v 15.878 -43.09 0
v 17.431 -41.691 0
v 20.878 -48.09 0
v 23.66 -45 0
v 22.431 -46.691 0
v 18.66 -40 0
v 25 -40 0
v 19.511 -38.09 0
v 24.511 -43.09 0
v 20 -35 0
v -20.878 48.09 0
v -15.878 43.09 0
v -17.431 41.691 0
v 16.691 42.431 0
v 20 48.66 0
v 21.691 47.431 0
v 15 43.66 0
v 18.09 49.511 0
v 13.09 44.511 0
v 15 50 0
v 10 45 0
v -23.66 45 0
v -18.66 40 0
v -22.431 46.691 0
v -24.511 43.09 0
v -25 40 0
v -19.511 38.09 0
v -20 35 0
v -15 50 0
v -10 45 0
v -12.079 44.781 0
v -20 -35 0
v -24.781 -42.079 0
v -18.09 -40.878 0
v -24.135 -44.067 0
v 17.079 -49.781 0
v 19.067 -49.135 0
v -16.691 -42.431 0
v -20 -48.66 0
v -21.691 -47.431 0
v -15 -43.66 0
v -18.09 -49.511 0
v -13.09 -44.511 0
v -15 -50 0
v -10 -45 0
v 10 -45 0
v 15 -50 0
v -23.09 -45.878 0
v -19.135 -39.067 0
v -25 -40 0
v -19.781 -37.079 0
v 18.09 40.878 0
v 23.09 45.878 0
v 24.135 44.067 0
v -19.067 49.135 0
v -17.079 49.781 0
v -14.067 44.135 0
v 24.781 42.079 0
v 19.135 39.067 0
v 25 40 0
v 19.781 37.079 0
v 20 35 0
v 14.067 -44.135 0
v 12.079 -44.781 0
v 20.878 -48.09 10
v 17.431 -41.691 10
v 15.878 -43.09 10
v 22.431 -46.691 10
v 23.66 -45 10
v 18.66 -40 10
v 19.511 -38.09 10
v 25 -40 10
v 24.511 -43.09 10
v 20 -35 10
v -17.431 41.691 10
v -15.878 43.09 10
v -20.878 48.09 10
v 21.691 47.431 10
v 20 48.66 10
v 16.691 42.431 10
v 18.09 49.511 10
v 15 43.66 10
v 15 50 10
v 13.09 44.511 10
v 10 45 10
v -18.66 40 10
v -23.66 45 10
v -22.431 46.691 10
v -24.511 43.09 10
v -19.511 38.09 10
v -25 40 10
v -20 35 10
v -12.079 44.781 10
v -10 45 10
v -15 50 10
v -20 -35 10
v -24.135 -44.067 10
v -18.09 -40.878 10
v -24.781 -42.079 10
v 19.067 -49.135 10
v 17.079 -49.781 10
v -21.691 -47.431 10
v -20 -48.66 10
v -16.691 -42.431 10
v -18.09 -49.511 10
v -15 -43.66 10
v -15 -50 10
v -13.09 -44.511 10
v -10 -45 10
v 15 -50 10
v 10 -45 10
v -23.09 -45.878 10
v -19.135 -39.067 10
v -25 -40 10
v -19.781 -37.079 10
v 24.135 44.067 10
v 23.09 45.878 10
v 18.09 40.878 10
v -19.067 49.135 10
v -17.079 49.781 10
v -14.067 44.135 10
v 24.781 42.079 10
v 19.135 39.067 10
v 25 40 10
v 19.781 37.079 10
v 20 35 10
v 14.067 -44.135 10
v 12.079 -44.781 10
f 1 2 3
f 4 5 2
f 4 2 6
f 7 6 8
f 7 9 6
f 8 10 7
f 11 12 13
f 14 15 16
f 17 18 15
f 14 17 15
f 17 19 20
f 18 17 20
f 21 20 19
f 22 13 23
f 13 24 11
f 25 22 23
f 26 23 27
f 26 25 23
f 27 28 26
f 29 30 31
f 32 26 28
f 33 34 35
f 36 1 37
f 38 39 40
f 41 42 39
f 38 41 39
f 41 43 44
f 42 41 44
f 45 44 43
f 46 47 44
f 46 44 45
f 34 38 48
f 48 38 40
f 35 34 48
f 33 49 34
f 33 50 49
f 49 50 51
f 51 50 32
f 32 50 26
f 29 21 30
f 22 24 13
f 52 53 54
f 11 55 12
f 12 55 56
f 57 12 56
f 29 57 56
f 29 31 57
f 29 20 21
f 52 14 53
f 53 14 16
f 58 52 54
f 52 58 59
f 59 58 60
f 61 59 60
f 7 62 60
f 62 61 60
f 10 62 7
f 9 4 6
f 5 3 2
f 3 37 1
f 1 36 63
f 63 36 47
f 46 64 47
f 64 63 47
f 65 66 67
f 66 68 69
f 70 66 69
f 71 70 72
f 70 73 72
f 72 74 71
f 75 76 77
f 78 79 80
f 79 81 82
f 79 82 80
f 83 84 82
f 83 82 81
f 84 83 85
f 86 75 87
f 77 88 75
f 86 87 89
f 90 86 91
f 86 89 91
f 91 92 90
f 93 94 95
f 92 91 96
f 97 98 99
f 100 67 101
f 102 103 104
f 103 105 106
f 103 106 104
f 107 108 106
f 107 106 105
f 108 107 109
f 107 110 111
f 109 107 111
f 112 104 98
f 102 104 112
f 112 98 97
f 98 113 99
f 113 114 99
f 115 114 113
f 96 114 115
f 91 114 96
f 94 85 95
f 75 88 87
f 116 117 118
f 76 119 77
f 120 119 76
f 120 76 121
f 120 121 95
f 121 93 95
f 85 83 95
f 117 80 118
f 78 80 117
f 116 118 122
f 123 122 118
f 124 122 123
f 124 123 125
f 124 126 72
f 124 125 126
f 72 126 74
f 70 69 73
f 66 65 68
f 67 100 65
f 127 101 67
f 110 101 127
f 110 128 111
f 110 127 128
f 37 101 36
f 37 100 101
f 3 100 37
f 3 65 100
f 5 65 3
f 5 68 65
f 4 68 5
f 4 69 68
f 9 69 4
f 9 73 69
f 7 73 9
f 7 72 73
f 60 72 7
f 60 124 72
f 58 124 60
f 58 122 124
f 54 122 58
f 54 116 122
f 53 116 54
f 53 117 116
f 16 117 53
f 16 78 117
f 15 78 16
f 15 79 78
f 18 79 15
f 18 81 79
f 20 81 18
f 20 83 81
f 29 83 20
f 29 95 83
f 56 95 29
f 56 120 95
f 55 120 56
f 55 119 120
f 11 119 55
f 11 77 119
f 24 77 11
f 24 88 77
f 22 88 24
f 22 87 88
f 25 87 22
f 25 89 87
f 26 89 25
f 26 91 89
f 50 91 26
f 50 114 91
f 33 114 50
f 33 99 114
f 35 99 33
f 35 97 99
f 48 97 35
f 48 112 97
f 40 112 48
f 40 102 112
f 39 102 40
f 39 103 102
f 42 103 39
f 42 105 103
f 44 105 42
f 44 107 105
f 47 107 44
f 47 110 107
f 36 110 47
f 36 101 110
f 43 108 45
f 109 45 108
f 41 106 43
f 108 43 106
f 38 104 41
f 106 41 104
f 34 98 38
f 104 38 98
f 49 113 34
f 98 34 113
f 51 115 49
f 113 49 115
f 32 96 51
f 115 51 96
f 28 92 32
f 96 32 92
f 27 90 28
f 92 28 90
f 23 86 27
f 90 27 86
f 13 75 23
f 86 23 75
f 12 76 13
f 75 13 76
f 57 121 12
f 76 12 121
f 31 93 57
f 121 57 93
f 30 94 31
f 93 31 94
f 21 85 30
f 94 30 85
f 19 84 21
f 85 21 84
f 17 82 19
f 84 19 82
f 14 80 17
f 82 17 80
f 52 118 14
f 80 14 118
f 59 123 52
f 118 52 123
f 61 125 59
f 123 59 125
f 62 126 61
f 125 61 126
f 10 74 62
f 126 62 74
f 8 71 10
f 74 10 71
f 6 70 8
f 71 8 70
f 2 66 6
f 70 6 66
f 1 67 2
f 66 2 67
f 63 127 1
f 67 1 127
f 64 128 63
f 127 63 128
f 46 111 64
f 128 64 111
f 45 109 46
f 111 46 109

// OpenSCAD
module rounded_hollow_square(outer_size, thickness, radius)
{
    new_outer_size = is_list(outer_size) ? [ outer_size[0] - radius * 2, outer_size[1] - radius * 2 ]
                                         : [ outer_size - radius * 2, outer_size - radius * 2 ];
    difference()
    {
        offset(radius) square(new_outer_size, center = true);
        offset(radius) square([ new_outer_size[0] - thickness, new_outer_size[1] - thickness ], center = true);
    }
}

linear_extrude(10) rounded_hollow_square(outer_size = [ 50, 100 ], thickness = 10, radius = 10);
